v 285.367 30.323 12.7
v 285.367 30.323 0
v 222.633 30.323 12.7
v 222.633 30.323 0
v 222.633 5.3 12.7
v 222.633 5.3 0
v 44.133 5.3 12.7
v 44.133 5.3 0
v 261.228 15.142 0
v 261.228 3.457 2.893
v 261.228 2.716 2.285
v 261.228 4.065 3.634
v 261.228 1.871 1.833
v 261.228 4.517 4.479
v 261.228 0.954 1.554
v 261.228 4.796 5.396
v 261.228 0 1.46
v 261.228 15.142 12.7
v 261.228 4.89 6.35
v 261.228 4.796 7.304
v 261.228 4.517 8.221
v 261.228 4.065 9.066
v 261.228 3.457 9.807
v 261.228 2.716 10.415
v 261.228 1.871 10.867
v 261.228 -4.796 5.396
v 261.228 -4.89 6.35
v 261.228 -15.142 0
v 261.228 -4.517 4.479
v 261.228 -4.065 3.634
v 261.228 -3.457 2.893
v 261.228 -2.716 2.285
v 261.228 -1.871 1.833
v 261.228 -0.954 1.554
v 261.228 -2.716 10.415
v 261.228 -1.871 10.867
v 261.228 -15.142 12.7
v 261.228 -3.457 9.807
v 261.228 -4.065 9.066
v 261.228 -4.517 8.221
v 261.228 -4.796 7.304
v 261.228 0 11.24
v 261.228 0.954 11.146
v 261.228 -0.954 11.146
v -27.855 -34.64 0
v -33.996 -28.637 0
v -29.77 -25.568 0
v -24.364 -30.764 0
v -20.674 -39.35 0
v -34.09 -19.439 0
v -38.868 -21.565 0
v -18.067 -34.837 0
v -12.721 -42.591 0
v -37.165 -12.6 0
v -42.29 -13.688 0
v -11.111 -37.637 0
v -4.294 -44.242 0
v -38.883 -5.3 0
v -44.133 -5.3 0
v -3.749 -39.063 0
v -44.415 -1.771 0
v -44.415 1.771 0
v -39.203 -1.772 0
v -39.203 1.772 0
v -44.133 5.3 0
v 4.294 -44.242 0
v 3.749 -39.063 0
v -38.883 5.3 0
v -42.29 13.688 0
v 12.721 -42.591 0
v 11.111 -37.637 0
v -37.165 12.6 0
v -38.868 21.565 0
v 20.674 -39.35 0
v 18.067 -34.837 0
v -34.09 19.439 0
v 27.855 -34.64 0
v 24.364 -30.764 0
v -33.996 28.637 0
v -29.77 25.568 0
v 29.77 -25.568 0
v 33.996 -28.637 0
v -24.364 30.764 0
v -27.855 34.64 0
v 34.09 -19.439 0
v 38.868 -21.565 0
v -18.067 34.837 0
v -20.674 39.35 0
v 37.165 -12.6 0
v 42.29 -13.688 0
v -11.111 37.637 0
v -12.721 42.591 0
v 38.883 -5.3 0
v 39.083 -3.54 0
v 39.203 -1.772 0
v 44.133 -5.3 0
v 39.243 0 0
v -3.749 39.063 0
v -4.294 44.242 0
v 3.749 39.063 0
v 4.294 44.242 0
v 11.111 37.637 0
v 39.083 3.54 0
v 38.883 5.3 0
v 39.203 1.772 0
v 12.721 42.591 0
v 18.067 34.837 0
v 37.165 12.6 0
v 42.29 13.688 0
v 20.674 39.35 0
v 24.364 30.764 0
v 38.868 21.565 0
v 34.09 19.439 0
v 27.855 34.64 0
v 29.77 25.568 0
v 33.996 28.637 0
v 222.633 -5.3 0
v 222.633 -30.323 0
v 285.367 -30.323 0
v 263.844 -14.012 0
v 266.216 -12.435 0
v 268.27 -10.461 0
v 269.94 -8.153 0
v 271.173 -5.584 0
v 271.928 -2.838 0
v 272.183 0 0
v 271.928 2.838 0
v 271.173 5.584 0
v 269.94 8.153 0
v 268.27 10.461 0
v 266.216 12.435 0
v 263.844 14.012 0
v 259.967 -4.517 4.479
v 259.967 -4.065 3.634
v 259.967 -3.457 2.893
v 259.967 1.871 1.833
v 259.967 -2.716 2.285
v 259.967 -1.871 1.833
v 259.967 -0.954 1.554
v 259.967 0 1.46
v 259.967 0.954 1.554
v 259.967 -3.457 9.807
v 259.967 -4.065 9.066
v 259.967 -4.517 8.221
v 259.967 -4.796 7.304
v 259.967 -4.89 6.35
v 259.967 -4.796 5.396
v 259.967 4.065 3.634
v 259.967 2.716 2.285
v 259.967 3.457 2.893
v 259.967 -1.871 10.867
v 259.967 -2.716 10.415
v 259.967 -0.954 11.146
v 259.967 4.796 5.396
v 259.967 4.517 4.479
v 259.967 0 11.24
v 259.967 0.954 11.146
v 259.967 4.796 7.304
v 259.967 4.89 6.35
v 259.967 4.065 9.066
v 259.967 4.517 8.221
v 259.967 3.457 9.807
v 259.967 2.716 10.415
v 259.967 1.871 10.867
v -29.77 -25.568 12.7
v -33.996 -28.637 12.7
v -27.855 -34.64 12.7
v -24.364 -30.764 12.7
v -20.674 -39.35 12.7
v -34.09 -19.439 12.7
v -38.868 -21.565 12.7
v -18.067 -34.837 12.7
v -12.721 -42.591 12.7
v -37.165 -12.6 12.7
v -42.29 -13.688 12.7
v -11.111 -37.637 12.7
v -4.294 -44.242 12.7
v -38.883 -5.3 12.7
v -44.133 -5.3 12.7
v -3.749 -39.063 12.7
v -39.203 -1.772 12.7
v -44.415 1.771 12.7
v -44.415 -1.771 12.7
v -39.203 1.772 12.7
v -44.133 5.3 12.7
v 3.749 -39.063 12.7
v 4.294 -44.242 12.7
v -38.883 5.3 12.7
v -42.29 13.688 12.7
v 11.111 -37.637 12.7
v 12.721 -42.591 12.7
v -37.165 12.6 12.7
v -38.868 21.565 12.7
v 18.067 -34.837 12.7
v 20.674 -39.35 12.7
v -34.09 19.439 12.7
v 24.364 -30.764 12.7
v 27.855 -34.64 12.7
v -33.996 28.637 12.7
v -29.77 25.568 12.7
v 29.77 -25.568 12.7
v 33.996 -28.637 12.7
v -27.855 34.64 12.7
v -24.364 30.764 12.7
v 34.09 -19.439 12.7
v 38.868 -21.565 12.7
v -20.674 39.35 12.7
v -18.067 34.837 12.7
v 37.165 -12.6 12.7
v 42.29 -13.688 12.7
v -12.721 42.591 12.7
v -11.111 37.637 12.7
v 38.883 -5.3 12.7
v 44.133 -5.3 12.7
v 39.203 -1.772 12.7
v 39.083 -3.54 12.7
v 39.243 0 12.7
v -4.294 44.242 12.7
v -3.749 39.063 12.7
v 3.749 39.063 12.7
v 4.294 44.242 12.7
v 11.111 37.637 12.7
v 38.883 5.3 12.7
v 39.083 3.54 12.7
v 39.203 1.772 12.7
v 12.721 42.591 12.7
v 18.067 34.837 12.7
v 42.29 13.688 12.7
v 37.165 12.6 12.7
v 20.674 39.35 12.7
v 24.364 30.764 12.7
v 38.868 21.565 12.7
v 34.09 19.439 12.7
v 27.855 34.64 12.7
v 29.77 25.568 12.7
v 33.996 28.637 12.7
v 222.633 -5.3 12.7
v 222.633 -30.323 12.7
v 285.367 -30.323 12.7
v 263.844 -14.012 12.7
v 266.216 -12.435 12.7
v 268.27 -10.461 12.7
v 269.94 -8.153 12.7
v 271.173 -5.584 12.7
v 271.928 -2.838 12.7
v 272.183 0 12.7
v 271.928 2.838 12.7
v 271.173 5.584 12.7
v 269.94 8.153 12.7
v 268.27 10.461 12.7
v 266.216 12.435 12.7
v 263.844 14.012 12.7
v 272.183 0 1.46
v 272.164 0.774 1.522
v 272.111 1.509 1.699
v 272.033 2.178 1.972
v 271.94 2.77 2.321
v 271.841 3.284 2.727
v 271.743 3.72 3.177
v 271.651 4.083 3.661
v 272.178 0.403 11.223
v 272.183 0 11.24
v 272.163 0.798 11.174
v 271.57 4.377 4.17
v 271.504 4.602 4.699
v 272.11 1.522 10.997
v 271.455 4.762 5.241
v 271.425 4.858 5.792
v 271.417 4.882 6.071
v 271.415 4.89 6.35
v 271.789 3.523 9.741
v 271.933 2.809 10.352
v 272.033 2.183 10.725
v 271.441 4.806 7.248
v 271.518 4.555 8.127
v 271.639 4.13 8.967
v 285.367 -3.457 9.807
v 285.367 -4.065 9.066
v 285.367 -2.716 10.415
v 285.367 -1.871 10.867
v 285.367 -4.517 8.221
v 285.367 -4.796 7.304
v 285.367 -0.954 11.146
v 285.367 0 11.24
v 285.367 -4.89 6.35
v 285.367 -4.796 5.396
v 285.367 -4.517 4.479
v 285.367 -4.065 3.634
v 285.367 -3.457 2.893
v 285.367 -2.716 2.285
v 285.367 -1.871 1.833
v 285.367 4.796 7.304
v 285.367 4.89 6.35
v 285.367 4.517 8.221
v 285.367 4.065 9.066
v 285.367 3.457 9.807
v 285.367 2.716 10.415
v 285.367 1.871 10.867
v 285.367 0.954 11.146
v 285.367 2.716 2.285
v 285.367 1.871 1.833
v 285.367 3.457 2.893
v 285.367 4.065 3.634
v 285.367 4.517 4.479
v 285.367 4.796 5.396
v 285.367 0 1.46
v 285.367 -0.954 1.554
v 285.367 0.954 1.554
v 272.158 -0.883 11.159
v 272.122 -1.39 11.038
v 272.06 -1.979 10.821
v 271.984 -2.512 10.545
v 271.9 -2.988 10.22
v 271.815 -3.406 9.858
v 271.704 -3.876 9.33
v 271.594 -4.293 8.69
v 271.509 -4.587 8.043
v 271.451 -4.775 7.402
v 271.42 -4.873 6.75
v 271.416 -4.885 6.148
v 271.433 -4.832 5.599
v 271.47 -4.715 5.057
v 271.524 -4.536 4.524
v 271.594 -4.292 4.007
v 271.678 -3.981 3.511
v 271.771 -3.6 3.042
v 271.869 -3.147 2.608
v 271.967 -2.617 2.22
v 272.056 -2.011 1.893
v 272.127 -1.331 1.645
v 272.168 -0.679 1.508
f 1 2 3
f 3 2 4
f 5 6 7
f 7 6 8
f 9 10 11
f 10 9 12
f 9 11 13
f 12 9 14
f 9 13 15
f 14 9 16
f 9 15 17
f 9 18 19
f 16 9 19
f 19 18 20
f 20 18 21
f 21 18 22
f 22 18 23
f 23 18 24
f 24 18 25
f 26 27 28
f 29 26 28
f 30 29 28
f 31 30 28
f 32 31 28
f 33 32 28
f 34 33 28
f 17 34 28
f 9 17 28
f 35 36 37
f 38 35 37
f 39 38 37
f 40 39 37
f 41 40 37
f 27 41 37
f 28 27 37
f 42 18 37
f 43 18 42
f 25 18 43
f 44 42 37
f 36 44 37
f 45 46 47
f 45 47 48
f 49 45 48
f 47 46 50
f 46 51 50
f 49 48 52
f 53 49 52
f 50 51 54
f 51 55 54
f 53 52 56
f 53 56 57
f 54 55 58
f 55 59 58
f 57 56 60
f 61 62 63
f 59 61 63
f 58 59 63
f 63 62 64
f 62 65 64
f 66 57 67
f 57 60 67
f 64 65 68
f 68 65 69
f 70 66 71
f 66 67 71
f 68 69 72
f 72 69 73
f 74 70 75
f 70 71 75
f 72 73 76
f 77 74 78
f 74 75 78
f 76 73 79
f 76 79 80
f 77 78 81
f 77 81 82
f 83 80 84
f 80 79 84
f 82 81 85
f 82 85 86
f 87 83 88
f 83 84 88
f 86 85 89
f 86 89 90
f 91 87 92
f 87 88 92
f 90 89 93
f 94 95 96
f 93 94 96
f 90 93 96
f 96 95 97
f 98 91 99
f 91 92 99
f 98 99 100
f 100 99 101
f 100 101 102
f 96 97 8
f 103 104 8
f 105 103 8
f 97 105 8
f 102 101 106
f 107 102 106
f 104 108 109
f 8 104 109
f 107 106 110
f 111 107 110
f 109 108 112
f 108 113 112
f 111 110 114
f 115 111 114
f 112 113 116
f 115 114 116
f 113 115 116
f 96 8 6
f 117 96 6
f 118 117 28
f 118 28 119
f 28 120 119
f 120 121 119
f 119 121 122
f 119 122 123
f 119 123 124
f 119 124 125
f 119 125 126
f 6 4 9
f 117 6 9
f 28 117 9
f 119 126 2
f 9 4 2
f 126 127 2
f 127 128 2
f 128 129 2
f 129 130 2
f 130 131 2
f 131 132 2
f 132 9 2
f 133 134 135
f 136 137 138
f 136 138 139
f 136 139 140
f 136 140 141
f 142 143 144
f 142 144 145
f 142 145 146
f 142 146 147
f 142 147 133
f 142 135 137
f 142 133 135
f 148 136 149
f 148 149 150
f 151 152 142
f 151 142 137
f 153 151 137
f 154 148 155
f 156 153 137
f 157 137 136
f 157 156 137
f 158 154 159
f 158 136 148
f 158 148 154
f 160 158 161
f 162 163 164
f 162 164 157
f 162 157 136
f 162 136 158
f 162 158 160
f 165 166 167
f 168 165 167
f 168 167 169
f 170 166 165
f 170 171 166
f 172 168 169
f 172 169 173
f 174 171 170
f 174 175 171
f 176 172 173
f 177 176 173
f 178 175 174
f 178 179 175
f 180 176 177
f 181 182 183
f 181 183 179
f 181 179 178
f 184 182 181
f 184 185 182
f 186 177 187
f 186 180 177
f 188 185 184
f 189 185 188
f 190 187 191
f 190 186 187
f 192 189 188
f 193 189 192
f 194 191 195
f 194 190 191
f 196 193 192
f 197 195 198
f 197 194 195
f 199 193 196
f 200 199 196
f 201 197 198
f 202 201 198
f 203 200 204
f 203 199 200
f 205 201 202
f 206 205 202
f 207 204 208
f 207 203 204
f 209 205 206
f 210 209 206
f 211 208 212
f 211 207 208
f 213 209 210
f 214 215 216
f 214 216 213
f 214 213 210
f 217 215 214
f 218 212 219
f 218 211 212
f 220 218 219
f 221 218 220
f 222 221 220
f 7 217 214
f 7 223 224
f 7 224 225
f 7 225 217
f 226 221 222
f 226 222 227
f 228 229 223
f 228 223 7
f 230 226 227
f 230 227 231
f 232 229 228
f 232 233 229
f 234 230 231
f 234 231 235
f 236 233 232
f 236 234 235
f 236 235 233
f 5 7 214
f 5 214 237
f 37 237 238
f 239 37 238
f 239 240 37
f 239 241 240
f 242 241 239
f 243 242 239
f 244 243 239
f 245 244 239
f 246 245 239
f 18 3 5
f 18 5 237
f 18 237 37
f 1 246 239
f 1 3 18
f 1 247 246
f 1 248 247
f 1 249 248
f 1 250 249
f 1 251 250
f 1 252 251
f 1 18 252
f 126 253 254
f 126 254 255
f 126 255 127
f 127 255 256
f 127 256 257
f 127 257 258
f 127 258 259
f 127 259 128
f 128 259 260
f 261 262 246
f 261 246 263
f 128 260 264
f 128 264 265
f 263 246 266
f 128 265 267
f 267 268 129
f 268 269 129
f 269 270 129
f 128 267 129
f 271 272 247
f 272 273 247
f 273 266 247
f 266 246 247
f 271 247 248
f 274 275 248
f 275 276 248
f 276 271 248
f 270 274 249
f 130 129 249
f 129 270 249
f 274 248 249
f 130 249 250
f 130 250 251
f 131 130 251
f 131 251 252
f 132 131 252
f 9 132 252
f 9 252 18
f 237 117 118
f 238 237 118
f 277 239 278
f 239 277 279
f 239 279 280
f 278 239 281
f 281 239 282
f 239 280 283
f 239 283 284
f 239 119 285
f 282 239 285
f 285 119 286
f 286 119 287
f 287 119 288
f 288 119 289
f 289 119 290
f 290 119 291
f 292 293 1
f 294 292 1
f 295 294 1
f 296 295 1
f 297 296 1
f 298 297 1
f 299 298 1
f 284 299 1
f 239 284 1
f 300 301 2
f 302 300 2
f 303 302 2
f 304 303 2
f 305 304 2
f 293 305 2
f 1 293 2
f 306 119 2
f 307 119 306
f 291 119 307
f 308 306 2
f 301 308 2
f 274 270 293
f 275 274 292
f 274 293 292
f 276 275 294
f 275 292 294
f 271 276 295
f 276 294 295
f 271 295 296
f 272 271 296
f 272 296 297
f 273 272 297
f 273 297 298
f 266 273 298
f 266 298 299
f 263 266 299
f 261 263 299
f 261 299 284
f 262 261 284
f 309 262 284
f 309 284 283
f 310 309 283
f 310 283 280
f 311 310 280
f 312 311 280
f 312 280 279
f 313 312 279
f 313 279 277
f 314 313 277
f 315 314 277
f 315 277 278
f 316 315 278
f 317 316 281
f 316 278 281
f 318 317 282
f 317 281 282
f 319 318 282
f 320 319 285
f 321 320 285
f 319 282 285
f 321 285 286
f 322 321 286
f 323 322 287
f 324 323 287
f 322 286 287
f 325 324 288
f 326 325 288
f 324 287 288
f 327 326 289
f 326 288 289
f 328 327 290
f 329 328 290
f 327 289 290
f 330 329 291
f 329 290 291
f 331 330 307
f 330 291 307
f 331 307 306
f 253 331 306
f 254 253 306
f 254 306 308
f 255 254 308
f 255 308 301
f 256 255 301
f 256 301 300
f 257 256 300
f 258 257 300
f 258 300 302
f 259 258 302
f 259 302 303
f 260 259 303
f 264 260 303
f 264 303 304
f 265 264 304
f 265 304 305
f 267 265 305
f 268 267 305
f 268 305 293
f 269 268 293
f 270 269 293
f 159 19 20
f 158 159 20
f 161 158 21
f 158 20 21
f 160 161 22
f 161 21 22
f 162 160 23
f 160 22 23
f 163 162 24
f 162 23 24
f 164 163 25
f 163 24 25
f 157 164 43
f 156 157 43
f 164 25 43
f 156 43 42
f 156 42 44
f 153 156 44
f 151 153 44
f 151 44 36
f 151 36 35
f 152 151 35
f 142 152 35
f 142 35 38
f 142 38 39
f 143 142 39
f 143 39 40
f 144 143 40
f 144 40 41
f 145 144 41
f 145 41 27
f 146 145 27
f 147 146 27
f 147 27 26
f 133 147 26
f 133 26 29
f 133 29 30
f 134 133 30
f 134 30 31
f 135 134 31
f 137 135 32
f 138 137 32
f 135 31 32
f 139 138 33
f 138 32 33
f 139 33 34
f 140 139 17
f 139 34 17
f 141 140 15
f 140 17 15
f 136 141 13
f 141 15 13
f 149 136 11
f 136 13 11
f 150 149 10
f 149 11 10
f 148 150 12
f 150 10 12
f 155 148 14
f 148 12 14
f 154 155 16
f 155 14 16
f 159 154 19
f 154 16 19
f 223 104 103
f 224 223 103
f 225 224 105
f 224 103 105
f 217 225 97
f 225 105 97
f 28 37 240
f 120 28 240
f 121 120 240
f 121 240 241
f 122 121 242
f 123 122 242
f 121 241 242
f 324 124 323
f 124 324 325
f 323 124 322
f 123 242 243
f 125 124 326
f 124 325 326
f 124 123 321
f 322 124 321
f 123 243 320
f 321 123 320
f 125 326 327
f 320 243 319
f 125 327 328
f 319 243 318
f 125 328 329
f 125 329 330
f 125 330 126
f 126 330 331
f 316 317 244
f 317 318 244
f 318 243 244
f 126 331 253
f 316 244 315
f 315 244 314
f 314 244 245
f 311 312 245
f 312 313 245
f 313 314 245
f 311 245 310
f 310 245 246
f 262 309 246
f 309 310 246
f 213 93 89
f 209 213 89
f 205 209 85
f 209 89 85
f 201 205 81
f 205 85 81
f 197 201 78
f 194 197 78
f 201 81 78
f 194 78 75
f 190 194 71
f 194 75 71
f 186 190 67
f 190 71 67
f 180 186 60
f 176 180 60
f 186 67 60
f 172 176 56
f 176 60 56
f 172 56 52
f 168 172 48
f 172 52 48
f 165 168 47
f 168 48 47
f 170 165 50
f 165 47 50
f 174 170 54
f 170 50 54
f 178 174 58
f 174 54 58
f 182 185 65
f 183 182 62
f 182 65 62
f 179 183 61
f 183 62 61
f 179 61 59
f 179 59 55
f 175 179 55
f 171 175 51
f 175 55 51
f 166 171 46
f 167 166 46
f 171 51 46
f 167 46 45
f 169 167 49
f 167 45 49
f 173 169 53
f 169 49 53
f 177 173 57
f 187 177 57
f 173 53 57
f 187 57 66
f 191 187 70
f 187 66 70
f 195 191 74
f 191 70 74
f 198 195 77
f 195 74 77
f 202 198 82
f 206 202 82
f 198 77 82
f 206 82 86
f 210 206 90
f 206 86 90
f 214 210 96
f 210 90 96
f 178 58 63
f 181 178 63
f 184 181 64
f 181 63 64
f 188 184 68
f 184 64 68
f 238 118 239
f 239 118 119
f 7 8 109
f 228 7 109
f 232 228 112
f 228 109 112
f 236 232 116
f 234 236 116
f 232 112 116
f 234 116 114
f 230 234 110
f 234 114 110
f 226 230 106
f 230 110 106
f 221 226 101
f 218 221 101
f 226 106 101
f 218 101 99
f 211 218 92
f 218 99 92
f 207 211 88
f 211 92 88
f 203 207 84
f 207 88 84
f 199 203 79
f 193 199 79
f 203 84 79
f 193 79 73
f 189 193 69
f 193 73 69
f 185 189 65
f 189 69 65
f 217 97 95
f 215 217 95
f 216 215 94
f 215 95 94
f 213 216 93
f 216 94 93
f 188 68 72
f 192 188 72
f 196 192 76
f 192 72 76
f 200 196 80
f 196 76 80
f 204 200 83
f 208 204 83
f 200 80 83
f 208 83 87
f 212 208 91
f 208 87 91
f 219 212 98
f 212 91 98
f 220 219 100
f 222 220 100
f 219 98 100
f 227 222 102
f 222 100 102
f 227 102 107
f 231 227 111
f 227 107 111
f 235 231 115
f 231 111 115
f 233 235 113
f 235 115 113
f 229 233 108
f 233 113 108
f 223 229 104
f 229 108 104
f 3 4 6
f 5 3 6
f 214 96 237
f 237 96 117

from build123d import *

# Parameters (mm, degrees)
F1_DEPTH = 12.7
F3_DEPTH = 25.4
F4_R     = 4.8895
F5_DEPTH = 25.4


with BuildPart() as f1:
    # F0 (on Top) → F1 (new body)
    with BuildSketch(Plane.XY):
        Polygon((222.6329271213, 5.3004485337), (222.6329271213, 0), (222.6329271213, -5.3004485337), (222.6329271213, -30.3229389596), (285.3670728787, -30.3229389596), (285.3670728787, 30.3229389596), (222.6329271213, 30.3229389596), align=None)
        with BuildLine():
            ThreePointArc((44.1328420266, 5.3004485337), (44.3706396623, 2.654964399), (44.45, 0))
            Line((44.45, 0), (222.6329271213, 0))
            Line((222.6329271213, 0), (222.6329271213, 5.3004485337))
            Line((222.6329271213, 5.3004485337), (44.1328420266, 5.3004485337))
        make_face()
        with BuildLine():
            Line((222.6329271213, 0), (44.45, 0))
            ThreePointArc((44.45, 0), (44.3706396623, -2.654964399), (44.1328420266, -5.3004485337))
            Line((44.1328420266, -5.3004485337), (222.6329271213, -5.3004485337))
            Line((222.6329271213, -5.3004485337), (222.6329271213, 0))
        make_face()
        with BuildLine():
            ThreePointArc((-38.8833935549, 5.3004485337), (0, 39.243), (38.8833935548, 5.3004485337))
            Line((38.8833935548, 5.3004485337), (44.1328420266, 5.3004485337))
            ThreePointArc((44.1328420266, 5.3004485337), (0, 44.45), (-44.1328420266, 5.3004485337))
            Line((-44.1328420266, 5.3004485337), (-38.8833935549, 5.3004485337))
        make_face()
        with BuildLine():
            Line((44.1328420266, -5.3004485337), (38.8833935548, -5.3004485337))
            ThreePointArc((38.8833935548, -5.3004485337), (0, -39.243), (-38.8833935549, -5.3004485337))
            Line((-38.8833935549, -5.3004485337), (-44.1328420266, -5.3004485337))
            ThreePointArc((-44.1328420266, -5.3004485337), (0, -44.45), (44.1328420266, -5.3004485337))
        make_face()
        with BuildLine():
            ThreePointArc((38.8833935548, 5.3004485337), (39.1529951745, 2.656316597), (39.243, 0))
            Line((39.243, 0), (44.45, 0))
            ThreePointArc((44.45, 0), (44.3706396623, 2.654964399), (44.1328420266, 5.3004485337))
            Line((44.1328420266, 5.3004485337), (38.8833935548, 5.3004485337))
        make_face()
        with BuildLine():
            Line((44.45, 0), (39.243, 0))
            ThreePointArc((39.243, 0), (39.1529951745, -2.656316597), (38.8833935548, -5.3004485337))
            Line((38.8833935548, -5.3004485337), (44.1328420266, -5.3004485337))
            ThreePointArc((44.1328420266, -5.3004485337), (44.3706396623, -2.654964399), (44.45, 0))
        make_face()
        with BuildLine():
            ThreePointArc((-38.8833935549, -5.3004485337), (-39.243, 0), (-38.8833935549, 5.3004485337))
            Line((-38.8833935549, 5.3004485337), (-44.1328420266, 5.3004485337))
            ThreePointArc((-44.1328420266, 5.3004485337), (-44.45, 0), (-44.1328420266, -5.3004485337))
            Line((-44.1328420266, -5.3004485337), (-38.8833935549, -5.3004485337))
        make_face()
    extrude(amount=F1_DEPTH)

    # F2 (on face) → F3 (cut)
    with BuildSketch(Plane.XY.offset(12.7)):
        with BuildLine():
            ThreePointArc((261.2282336072, -15.141530461), (269.1570726001, -9.3443922439), (272.182900235, 0))
            ThreePointArc((272.182900235, 0), (269.1570726001, 9.3443922439), (261.2282336072, 15.141530461))
            Line((261.2282336072, 15.141530461), (261.2282336072, -15.141530461))
        make_face()
    extrude(amount=-F3_DEPTH, mode=Mode.SUBTRACT)

    # F4 (on face) → F5 (cut)
    with BuildSketch(Plane.YZ.offset(285.3670728787)):
        with Locations((0, 6.35)):
            Circle(F4_R)
    extrude(amount=-F5_DEPTH, mode=Mode.SUBTRACT)


solid = f1.part
